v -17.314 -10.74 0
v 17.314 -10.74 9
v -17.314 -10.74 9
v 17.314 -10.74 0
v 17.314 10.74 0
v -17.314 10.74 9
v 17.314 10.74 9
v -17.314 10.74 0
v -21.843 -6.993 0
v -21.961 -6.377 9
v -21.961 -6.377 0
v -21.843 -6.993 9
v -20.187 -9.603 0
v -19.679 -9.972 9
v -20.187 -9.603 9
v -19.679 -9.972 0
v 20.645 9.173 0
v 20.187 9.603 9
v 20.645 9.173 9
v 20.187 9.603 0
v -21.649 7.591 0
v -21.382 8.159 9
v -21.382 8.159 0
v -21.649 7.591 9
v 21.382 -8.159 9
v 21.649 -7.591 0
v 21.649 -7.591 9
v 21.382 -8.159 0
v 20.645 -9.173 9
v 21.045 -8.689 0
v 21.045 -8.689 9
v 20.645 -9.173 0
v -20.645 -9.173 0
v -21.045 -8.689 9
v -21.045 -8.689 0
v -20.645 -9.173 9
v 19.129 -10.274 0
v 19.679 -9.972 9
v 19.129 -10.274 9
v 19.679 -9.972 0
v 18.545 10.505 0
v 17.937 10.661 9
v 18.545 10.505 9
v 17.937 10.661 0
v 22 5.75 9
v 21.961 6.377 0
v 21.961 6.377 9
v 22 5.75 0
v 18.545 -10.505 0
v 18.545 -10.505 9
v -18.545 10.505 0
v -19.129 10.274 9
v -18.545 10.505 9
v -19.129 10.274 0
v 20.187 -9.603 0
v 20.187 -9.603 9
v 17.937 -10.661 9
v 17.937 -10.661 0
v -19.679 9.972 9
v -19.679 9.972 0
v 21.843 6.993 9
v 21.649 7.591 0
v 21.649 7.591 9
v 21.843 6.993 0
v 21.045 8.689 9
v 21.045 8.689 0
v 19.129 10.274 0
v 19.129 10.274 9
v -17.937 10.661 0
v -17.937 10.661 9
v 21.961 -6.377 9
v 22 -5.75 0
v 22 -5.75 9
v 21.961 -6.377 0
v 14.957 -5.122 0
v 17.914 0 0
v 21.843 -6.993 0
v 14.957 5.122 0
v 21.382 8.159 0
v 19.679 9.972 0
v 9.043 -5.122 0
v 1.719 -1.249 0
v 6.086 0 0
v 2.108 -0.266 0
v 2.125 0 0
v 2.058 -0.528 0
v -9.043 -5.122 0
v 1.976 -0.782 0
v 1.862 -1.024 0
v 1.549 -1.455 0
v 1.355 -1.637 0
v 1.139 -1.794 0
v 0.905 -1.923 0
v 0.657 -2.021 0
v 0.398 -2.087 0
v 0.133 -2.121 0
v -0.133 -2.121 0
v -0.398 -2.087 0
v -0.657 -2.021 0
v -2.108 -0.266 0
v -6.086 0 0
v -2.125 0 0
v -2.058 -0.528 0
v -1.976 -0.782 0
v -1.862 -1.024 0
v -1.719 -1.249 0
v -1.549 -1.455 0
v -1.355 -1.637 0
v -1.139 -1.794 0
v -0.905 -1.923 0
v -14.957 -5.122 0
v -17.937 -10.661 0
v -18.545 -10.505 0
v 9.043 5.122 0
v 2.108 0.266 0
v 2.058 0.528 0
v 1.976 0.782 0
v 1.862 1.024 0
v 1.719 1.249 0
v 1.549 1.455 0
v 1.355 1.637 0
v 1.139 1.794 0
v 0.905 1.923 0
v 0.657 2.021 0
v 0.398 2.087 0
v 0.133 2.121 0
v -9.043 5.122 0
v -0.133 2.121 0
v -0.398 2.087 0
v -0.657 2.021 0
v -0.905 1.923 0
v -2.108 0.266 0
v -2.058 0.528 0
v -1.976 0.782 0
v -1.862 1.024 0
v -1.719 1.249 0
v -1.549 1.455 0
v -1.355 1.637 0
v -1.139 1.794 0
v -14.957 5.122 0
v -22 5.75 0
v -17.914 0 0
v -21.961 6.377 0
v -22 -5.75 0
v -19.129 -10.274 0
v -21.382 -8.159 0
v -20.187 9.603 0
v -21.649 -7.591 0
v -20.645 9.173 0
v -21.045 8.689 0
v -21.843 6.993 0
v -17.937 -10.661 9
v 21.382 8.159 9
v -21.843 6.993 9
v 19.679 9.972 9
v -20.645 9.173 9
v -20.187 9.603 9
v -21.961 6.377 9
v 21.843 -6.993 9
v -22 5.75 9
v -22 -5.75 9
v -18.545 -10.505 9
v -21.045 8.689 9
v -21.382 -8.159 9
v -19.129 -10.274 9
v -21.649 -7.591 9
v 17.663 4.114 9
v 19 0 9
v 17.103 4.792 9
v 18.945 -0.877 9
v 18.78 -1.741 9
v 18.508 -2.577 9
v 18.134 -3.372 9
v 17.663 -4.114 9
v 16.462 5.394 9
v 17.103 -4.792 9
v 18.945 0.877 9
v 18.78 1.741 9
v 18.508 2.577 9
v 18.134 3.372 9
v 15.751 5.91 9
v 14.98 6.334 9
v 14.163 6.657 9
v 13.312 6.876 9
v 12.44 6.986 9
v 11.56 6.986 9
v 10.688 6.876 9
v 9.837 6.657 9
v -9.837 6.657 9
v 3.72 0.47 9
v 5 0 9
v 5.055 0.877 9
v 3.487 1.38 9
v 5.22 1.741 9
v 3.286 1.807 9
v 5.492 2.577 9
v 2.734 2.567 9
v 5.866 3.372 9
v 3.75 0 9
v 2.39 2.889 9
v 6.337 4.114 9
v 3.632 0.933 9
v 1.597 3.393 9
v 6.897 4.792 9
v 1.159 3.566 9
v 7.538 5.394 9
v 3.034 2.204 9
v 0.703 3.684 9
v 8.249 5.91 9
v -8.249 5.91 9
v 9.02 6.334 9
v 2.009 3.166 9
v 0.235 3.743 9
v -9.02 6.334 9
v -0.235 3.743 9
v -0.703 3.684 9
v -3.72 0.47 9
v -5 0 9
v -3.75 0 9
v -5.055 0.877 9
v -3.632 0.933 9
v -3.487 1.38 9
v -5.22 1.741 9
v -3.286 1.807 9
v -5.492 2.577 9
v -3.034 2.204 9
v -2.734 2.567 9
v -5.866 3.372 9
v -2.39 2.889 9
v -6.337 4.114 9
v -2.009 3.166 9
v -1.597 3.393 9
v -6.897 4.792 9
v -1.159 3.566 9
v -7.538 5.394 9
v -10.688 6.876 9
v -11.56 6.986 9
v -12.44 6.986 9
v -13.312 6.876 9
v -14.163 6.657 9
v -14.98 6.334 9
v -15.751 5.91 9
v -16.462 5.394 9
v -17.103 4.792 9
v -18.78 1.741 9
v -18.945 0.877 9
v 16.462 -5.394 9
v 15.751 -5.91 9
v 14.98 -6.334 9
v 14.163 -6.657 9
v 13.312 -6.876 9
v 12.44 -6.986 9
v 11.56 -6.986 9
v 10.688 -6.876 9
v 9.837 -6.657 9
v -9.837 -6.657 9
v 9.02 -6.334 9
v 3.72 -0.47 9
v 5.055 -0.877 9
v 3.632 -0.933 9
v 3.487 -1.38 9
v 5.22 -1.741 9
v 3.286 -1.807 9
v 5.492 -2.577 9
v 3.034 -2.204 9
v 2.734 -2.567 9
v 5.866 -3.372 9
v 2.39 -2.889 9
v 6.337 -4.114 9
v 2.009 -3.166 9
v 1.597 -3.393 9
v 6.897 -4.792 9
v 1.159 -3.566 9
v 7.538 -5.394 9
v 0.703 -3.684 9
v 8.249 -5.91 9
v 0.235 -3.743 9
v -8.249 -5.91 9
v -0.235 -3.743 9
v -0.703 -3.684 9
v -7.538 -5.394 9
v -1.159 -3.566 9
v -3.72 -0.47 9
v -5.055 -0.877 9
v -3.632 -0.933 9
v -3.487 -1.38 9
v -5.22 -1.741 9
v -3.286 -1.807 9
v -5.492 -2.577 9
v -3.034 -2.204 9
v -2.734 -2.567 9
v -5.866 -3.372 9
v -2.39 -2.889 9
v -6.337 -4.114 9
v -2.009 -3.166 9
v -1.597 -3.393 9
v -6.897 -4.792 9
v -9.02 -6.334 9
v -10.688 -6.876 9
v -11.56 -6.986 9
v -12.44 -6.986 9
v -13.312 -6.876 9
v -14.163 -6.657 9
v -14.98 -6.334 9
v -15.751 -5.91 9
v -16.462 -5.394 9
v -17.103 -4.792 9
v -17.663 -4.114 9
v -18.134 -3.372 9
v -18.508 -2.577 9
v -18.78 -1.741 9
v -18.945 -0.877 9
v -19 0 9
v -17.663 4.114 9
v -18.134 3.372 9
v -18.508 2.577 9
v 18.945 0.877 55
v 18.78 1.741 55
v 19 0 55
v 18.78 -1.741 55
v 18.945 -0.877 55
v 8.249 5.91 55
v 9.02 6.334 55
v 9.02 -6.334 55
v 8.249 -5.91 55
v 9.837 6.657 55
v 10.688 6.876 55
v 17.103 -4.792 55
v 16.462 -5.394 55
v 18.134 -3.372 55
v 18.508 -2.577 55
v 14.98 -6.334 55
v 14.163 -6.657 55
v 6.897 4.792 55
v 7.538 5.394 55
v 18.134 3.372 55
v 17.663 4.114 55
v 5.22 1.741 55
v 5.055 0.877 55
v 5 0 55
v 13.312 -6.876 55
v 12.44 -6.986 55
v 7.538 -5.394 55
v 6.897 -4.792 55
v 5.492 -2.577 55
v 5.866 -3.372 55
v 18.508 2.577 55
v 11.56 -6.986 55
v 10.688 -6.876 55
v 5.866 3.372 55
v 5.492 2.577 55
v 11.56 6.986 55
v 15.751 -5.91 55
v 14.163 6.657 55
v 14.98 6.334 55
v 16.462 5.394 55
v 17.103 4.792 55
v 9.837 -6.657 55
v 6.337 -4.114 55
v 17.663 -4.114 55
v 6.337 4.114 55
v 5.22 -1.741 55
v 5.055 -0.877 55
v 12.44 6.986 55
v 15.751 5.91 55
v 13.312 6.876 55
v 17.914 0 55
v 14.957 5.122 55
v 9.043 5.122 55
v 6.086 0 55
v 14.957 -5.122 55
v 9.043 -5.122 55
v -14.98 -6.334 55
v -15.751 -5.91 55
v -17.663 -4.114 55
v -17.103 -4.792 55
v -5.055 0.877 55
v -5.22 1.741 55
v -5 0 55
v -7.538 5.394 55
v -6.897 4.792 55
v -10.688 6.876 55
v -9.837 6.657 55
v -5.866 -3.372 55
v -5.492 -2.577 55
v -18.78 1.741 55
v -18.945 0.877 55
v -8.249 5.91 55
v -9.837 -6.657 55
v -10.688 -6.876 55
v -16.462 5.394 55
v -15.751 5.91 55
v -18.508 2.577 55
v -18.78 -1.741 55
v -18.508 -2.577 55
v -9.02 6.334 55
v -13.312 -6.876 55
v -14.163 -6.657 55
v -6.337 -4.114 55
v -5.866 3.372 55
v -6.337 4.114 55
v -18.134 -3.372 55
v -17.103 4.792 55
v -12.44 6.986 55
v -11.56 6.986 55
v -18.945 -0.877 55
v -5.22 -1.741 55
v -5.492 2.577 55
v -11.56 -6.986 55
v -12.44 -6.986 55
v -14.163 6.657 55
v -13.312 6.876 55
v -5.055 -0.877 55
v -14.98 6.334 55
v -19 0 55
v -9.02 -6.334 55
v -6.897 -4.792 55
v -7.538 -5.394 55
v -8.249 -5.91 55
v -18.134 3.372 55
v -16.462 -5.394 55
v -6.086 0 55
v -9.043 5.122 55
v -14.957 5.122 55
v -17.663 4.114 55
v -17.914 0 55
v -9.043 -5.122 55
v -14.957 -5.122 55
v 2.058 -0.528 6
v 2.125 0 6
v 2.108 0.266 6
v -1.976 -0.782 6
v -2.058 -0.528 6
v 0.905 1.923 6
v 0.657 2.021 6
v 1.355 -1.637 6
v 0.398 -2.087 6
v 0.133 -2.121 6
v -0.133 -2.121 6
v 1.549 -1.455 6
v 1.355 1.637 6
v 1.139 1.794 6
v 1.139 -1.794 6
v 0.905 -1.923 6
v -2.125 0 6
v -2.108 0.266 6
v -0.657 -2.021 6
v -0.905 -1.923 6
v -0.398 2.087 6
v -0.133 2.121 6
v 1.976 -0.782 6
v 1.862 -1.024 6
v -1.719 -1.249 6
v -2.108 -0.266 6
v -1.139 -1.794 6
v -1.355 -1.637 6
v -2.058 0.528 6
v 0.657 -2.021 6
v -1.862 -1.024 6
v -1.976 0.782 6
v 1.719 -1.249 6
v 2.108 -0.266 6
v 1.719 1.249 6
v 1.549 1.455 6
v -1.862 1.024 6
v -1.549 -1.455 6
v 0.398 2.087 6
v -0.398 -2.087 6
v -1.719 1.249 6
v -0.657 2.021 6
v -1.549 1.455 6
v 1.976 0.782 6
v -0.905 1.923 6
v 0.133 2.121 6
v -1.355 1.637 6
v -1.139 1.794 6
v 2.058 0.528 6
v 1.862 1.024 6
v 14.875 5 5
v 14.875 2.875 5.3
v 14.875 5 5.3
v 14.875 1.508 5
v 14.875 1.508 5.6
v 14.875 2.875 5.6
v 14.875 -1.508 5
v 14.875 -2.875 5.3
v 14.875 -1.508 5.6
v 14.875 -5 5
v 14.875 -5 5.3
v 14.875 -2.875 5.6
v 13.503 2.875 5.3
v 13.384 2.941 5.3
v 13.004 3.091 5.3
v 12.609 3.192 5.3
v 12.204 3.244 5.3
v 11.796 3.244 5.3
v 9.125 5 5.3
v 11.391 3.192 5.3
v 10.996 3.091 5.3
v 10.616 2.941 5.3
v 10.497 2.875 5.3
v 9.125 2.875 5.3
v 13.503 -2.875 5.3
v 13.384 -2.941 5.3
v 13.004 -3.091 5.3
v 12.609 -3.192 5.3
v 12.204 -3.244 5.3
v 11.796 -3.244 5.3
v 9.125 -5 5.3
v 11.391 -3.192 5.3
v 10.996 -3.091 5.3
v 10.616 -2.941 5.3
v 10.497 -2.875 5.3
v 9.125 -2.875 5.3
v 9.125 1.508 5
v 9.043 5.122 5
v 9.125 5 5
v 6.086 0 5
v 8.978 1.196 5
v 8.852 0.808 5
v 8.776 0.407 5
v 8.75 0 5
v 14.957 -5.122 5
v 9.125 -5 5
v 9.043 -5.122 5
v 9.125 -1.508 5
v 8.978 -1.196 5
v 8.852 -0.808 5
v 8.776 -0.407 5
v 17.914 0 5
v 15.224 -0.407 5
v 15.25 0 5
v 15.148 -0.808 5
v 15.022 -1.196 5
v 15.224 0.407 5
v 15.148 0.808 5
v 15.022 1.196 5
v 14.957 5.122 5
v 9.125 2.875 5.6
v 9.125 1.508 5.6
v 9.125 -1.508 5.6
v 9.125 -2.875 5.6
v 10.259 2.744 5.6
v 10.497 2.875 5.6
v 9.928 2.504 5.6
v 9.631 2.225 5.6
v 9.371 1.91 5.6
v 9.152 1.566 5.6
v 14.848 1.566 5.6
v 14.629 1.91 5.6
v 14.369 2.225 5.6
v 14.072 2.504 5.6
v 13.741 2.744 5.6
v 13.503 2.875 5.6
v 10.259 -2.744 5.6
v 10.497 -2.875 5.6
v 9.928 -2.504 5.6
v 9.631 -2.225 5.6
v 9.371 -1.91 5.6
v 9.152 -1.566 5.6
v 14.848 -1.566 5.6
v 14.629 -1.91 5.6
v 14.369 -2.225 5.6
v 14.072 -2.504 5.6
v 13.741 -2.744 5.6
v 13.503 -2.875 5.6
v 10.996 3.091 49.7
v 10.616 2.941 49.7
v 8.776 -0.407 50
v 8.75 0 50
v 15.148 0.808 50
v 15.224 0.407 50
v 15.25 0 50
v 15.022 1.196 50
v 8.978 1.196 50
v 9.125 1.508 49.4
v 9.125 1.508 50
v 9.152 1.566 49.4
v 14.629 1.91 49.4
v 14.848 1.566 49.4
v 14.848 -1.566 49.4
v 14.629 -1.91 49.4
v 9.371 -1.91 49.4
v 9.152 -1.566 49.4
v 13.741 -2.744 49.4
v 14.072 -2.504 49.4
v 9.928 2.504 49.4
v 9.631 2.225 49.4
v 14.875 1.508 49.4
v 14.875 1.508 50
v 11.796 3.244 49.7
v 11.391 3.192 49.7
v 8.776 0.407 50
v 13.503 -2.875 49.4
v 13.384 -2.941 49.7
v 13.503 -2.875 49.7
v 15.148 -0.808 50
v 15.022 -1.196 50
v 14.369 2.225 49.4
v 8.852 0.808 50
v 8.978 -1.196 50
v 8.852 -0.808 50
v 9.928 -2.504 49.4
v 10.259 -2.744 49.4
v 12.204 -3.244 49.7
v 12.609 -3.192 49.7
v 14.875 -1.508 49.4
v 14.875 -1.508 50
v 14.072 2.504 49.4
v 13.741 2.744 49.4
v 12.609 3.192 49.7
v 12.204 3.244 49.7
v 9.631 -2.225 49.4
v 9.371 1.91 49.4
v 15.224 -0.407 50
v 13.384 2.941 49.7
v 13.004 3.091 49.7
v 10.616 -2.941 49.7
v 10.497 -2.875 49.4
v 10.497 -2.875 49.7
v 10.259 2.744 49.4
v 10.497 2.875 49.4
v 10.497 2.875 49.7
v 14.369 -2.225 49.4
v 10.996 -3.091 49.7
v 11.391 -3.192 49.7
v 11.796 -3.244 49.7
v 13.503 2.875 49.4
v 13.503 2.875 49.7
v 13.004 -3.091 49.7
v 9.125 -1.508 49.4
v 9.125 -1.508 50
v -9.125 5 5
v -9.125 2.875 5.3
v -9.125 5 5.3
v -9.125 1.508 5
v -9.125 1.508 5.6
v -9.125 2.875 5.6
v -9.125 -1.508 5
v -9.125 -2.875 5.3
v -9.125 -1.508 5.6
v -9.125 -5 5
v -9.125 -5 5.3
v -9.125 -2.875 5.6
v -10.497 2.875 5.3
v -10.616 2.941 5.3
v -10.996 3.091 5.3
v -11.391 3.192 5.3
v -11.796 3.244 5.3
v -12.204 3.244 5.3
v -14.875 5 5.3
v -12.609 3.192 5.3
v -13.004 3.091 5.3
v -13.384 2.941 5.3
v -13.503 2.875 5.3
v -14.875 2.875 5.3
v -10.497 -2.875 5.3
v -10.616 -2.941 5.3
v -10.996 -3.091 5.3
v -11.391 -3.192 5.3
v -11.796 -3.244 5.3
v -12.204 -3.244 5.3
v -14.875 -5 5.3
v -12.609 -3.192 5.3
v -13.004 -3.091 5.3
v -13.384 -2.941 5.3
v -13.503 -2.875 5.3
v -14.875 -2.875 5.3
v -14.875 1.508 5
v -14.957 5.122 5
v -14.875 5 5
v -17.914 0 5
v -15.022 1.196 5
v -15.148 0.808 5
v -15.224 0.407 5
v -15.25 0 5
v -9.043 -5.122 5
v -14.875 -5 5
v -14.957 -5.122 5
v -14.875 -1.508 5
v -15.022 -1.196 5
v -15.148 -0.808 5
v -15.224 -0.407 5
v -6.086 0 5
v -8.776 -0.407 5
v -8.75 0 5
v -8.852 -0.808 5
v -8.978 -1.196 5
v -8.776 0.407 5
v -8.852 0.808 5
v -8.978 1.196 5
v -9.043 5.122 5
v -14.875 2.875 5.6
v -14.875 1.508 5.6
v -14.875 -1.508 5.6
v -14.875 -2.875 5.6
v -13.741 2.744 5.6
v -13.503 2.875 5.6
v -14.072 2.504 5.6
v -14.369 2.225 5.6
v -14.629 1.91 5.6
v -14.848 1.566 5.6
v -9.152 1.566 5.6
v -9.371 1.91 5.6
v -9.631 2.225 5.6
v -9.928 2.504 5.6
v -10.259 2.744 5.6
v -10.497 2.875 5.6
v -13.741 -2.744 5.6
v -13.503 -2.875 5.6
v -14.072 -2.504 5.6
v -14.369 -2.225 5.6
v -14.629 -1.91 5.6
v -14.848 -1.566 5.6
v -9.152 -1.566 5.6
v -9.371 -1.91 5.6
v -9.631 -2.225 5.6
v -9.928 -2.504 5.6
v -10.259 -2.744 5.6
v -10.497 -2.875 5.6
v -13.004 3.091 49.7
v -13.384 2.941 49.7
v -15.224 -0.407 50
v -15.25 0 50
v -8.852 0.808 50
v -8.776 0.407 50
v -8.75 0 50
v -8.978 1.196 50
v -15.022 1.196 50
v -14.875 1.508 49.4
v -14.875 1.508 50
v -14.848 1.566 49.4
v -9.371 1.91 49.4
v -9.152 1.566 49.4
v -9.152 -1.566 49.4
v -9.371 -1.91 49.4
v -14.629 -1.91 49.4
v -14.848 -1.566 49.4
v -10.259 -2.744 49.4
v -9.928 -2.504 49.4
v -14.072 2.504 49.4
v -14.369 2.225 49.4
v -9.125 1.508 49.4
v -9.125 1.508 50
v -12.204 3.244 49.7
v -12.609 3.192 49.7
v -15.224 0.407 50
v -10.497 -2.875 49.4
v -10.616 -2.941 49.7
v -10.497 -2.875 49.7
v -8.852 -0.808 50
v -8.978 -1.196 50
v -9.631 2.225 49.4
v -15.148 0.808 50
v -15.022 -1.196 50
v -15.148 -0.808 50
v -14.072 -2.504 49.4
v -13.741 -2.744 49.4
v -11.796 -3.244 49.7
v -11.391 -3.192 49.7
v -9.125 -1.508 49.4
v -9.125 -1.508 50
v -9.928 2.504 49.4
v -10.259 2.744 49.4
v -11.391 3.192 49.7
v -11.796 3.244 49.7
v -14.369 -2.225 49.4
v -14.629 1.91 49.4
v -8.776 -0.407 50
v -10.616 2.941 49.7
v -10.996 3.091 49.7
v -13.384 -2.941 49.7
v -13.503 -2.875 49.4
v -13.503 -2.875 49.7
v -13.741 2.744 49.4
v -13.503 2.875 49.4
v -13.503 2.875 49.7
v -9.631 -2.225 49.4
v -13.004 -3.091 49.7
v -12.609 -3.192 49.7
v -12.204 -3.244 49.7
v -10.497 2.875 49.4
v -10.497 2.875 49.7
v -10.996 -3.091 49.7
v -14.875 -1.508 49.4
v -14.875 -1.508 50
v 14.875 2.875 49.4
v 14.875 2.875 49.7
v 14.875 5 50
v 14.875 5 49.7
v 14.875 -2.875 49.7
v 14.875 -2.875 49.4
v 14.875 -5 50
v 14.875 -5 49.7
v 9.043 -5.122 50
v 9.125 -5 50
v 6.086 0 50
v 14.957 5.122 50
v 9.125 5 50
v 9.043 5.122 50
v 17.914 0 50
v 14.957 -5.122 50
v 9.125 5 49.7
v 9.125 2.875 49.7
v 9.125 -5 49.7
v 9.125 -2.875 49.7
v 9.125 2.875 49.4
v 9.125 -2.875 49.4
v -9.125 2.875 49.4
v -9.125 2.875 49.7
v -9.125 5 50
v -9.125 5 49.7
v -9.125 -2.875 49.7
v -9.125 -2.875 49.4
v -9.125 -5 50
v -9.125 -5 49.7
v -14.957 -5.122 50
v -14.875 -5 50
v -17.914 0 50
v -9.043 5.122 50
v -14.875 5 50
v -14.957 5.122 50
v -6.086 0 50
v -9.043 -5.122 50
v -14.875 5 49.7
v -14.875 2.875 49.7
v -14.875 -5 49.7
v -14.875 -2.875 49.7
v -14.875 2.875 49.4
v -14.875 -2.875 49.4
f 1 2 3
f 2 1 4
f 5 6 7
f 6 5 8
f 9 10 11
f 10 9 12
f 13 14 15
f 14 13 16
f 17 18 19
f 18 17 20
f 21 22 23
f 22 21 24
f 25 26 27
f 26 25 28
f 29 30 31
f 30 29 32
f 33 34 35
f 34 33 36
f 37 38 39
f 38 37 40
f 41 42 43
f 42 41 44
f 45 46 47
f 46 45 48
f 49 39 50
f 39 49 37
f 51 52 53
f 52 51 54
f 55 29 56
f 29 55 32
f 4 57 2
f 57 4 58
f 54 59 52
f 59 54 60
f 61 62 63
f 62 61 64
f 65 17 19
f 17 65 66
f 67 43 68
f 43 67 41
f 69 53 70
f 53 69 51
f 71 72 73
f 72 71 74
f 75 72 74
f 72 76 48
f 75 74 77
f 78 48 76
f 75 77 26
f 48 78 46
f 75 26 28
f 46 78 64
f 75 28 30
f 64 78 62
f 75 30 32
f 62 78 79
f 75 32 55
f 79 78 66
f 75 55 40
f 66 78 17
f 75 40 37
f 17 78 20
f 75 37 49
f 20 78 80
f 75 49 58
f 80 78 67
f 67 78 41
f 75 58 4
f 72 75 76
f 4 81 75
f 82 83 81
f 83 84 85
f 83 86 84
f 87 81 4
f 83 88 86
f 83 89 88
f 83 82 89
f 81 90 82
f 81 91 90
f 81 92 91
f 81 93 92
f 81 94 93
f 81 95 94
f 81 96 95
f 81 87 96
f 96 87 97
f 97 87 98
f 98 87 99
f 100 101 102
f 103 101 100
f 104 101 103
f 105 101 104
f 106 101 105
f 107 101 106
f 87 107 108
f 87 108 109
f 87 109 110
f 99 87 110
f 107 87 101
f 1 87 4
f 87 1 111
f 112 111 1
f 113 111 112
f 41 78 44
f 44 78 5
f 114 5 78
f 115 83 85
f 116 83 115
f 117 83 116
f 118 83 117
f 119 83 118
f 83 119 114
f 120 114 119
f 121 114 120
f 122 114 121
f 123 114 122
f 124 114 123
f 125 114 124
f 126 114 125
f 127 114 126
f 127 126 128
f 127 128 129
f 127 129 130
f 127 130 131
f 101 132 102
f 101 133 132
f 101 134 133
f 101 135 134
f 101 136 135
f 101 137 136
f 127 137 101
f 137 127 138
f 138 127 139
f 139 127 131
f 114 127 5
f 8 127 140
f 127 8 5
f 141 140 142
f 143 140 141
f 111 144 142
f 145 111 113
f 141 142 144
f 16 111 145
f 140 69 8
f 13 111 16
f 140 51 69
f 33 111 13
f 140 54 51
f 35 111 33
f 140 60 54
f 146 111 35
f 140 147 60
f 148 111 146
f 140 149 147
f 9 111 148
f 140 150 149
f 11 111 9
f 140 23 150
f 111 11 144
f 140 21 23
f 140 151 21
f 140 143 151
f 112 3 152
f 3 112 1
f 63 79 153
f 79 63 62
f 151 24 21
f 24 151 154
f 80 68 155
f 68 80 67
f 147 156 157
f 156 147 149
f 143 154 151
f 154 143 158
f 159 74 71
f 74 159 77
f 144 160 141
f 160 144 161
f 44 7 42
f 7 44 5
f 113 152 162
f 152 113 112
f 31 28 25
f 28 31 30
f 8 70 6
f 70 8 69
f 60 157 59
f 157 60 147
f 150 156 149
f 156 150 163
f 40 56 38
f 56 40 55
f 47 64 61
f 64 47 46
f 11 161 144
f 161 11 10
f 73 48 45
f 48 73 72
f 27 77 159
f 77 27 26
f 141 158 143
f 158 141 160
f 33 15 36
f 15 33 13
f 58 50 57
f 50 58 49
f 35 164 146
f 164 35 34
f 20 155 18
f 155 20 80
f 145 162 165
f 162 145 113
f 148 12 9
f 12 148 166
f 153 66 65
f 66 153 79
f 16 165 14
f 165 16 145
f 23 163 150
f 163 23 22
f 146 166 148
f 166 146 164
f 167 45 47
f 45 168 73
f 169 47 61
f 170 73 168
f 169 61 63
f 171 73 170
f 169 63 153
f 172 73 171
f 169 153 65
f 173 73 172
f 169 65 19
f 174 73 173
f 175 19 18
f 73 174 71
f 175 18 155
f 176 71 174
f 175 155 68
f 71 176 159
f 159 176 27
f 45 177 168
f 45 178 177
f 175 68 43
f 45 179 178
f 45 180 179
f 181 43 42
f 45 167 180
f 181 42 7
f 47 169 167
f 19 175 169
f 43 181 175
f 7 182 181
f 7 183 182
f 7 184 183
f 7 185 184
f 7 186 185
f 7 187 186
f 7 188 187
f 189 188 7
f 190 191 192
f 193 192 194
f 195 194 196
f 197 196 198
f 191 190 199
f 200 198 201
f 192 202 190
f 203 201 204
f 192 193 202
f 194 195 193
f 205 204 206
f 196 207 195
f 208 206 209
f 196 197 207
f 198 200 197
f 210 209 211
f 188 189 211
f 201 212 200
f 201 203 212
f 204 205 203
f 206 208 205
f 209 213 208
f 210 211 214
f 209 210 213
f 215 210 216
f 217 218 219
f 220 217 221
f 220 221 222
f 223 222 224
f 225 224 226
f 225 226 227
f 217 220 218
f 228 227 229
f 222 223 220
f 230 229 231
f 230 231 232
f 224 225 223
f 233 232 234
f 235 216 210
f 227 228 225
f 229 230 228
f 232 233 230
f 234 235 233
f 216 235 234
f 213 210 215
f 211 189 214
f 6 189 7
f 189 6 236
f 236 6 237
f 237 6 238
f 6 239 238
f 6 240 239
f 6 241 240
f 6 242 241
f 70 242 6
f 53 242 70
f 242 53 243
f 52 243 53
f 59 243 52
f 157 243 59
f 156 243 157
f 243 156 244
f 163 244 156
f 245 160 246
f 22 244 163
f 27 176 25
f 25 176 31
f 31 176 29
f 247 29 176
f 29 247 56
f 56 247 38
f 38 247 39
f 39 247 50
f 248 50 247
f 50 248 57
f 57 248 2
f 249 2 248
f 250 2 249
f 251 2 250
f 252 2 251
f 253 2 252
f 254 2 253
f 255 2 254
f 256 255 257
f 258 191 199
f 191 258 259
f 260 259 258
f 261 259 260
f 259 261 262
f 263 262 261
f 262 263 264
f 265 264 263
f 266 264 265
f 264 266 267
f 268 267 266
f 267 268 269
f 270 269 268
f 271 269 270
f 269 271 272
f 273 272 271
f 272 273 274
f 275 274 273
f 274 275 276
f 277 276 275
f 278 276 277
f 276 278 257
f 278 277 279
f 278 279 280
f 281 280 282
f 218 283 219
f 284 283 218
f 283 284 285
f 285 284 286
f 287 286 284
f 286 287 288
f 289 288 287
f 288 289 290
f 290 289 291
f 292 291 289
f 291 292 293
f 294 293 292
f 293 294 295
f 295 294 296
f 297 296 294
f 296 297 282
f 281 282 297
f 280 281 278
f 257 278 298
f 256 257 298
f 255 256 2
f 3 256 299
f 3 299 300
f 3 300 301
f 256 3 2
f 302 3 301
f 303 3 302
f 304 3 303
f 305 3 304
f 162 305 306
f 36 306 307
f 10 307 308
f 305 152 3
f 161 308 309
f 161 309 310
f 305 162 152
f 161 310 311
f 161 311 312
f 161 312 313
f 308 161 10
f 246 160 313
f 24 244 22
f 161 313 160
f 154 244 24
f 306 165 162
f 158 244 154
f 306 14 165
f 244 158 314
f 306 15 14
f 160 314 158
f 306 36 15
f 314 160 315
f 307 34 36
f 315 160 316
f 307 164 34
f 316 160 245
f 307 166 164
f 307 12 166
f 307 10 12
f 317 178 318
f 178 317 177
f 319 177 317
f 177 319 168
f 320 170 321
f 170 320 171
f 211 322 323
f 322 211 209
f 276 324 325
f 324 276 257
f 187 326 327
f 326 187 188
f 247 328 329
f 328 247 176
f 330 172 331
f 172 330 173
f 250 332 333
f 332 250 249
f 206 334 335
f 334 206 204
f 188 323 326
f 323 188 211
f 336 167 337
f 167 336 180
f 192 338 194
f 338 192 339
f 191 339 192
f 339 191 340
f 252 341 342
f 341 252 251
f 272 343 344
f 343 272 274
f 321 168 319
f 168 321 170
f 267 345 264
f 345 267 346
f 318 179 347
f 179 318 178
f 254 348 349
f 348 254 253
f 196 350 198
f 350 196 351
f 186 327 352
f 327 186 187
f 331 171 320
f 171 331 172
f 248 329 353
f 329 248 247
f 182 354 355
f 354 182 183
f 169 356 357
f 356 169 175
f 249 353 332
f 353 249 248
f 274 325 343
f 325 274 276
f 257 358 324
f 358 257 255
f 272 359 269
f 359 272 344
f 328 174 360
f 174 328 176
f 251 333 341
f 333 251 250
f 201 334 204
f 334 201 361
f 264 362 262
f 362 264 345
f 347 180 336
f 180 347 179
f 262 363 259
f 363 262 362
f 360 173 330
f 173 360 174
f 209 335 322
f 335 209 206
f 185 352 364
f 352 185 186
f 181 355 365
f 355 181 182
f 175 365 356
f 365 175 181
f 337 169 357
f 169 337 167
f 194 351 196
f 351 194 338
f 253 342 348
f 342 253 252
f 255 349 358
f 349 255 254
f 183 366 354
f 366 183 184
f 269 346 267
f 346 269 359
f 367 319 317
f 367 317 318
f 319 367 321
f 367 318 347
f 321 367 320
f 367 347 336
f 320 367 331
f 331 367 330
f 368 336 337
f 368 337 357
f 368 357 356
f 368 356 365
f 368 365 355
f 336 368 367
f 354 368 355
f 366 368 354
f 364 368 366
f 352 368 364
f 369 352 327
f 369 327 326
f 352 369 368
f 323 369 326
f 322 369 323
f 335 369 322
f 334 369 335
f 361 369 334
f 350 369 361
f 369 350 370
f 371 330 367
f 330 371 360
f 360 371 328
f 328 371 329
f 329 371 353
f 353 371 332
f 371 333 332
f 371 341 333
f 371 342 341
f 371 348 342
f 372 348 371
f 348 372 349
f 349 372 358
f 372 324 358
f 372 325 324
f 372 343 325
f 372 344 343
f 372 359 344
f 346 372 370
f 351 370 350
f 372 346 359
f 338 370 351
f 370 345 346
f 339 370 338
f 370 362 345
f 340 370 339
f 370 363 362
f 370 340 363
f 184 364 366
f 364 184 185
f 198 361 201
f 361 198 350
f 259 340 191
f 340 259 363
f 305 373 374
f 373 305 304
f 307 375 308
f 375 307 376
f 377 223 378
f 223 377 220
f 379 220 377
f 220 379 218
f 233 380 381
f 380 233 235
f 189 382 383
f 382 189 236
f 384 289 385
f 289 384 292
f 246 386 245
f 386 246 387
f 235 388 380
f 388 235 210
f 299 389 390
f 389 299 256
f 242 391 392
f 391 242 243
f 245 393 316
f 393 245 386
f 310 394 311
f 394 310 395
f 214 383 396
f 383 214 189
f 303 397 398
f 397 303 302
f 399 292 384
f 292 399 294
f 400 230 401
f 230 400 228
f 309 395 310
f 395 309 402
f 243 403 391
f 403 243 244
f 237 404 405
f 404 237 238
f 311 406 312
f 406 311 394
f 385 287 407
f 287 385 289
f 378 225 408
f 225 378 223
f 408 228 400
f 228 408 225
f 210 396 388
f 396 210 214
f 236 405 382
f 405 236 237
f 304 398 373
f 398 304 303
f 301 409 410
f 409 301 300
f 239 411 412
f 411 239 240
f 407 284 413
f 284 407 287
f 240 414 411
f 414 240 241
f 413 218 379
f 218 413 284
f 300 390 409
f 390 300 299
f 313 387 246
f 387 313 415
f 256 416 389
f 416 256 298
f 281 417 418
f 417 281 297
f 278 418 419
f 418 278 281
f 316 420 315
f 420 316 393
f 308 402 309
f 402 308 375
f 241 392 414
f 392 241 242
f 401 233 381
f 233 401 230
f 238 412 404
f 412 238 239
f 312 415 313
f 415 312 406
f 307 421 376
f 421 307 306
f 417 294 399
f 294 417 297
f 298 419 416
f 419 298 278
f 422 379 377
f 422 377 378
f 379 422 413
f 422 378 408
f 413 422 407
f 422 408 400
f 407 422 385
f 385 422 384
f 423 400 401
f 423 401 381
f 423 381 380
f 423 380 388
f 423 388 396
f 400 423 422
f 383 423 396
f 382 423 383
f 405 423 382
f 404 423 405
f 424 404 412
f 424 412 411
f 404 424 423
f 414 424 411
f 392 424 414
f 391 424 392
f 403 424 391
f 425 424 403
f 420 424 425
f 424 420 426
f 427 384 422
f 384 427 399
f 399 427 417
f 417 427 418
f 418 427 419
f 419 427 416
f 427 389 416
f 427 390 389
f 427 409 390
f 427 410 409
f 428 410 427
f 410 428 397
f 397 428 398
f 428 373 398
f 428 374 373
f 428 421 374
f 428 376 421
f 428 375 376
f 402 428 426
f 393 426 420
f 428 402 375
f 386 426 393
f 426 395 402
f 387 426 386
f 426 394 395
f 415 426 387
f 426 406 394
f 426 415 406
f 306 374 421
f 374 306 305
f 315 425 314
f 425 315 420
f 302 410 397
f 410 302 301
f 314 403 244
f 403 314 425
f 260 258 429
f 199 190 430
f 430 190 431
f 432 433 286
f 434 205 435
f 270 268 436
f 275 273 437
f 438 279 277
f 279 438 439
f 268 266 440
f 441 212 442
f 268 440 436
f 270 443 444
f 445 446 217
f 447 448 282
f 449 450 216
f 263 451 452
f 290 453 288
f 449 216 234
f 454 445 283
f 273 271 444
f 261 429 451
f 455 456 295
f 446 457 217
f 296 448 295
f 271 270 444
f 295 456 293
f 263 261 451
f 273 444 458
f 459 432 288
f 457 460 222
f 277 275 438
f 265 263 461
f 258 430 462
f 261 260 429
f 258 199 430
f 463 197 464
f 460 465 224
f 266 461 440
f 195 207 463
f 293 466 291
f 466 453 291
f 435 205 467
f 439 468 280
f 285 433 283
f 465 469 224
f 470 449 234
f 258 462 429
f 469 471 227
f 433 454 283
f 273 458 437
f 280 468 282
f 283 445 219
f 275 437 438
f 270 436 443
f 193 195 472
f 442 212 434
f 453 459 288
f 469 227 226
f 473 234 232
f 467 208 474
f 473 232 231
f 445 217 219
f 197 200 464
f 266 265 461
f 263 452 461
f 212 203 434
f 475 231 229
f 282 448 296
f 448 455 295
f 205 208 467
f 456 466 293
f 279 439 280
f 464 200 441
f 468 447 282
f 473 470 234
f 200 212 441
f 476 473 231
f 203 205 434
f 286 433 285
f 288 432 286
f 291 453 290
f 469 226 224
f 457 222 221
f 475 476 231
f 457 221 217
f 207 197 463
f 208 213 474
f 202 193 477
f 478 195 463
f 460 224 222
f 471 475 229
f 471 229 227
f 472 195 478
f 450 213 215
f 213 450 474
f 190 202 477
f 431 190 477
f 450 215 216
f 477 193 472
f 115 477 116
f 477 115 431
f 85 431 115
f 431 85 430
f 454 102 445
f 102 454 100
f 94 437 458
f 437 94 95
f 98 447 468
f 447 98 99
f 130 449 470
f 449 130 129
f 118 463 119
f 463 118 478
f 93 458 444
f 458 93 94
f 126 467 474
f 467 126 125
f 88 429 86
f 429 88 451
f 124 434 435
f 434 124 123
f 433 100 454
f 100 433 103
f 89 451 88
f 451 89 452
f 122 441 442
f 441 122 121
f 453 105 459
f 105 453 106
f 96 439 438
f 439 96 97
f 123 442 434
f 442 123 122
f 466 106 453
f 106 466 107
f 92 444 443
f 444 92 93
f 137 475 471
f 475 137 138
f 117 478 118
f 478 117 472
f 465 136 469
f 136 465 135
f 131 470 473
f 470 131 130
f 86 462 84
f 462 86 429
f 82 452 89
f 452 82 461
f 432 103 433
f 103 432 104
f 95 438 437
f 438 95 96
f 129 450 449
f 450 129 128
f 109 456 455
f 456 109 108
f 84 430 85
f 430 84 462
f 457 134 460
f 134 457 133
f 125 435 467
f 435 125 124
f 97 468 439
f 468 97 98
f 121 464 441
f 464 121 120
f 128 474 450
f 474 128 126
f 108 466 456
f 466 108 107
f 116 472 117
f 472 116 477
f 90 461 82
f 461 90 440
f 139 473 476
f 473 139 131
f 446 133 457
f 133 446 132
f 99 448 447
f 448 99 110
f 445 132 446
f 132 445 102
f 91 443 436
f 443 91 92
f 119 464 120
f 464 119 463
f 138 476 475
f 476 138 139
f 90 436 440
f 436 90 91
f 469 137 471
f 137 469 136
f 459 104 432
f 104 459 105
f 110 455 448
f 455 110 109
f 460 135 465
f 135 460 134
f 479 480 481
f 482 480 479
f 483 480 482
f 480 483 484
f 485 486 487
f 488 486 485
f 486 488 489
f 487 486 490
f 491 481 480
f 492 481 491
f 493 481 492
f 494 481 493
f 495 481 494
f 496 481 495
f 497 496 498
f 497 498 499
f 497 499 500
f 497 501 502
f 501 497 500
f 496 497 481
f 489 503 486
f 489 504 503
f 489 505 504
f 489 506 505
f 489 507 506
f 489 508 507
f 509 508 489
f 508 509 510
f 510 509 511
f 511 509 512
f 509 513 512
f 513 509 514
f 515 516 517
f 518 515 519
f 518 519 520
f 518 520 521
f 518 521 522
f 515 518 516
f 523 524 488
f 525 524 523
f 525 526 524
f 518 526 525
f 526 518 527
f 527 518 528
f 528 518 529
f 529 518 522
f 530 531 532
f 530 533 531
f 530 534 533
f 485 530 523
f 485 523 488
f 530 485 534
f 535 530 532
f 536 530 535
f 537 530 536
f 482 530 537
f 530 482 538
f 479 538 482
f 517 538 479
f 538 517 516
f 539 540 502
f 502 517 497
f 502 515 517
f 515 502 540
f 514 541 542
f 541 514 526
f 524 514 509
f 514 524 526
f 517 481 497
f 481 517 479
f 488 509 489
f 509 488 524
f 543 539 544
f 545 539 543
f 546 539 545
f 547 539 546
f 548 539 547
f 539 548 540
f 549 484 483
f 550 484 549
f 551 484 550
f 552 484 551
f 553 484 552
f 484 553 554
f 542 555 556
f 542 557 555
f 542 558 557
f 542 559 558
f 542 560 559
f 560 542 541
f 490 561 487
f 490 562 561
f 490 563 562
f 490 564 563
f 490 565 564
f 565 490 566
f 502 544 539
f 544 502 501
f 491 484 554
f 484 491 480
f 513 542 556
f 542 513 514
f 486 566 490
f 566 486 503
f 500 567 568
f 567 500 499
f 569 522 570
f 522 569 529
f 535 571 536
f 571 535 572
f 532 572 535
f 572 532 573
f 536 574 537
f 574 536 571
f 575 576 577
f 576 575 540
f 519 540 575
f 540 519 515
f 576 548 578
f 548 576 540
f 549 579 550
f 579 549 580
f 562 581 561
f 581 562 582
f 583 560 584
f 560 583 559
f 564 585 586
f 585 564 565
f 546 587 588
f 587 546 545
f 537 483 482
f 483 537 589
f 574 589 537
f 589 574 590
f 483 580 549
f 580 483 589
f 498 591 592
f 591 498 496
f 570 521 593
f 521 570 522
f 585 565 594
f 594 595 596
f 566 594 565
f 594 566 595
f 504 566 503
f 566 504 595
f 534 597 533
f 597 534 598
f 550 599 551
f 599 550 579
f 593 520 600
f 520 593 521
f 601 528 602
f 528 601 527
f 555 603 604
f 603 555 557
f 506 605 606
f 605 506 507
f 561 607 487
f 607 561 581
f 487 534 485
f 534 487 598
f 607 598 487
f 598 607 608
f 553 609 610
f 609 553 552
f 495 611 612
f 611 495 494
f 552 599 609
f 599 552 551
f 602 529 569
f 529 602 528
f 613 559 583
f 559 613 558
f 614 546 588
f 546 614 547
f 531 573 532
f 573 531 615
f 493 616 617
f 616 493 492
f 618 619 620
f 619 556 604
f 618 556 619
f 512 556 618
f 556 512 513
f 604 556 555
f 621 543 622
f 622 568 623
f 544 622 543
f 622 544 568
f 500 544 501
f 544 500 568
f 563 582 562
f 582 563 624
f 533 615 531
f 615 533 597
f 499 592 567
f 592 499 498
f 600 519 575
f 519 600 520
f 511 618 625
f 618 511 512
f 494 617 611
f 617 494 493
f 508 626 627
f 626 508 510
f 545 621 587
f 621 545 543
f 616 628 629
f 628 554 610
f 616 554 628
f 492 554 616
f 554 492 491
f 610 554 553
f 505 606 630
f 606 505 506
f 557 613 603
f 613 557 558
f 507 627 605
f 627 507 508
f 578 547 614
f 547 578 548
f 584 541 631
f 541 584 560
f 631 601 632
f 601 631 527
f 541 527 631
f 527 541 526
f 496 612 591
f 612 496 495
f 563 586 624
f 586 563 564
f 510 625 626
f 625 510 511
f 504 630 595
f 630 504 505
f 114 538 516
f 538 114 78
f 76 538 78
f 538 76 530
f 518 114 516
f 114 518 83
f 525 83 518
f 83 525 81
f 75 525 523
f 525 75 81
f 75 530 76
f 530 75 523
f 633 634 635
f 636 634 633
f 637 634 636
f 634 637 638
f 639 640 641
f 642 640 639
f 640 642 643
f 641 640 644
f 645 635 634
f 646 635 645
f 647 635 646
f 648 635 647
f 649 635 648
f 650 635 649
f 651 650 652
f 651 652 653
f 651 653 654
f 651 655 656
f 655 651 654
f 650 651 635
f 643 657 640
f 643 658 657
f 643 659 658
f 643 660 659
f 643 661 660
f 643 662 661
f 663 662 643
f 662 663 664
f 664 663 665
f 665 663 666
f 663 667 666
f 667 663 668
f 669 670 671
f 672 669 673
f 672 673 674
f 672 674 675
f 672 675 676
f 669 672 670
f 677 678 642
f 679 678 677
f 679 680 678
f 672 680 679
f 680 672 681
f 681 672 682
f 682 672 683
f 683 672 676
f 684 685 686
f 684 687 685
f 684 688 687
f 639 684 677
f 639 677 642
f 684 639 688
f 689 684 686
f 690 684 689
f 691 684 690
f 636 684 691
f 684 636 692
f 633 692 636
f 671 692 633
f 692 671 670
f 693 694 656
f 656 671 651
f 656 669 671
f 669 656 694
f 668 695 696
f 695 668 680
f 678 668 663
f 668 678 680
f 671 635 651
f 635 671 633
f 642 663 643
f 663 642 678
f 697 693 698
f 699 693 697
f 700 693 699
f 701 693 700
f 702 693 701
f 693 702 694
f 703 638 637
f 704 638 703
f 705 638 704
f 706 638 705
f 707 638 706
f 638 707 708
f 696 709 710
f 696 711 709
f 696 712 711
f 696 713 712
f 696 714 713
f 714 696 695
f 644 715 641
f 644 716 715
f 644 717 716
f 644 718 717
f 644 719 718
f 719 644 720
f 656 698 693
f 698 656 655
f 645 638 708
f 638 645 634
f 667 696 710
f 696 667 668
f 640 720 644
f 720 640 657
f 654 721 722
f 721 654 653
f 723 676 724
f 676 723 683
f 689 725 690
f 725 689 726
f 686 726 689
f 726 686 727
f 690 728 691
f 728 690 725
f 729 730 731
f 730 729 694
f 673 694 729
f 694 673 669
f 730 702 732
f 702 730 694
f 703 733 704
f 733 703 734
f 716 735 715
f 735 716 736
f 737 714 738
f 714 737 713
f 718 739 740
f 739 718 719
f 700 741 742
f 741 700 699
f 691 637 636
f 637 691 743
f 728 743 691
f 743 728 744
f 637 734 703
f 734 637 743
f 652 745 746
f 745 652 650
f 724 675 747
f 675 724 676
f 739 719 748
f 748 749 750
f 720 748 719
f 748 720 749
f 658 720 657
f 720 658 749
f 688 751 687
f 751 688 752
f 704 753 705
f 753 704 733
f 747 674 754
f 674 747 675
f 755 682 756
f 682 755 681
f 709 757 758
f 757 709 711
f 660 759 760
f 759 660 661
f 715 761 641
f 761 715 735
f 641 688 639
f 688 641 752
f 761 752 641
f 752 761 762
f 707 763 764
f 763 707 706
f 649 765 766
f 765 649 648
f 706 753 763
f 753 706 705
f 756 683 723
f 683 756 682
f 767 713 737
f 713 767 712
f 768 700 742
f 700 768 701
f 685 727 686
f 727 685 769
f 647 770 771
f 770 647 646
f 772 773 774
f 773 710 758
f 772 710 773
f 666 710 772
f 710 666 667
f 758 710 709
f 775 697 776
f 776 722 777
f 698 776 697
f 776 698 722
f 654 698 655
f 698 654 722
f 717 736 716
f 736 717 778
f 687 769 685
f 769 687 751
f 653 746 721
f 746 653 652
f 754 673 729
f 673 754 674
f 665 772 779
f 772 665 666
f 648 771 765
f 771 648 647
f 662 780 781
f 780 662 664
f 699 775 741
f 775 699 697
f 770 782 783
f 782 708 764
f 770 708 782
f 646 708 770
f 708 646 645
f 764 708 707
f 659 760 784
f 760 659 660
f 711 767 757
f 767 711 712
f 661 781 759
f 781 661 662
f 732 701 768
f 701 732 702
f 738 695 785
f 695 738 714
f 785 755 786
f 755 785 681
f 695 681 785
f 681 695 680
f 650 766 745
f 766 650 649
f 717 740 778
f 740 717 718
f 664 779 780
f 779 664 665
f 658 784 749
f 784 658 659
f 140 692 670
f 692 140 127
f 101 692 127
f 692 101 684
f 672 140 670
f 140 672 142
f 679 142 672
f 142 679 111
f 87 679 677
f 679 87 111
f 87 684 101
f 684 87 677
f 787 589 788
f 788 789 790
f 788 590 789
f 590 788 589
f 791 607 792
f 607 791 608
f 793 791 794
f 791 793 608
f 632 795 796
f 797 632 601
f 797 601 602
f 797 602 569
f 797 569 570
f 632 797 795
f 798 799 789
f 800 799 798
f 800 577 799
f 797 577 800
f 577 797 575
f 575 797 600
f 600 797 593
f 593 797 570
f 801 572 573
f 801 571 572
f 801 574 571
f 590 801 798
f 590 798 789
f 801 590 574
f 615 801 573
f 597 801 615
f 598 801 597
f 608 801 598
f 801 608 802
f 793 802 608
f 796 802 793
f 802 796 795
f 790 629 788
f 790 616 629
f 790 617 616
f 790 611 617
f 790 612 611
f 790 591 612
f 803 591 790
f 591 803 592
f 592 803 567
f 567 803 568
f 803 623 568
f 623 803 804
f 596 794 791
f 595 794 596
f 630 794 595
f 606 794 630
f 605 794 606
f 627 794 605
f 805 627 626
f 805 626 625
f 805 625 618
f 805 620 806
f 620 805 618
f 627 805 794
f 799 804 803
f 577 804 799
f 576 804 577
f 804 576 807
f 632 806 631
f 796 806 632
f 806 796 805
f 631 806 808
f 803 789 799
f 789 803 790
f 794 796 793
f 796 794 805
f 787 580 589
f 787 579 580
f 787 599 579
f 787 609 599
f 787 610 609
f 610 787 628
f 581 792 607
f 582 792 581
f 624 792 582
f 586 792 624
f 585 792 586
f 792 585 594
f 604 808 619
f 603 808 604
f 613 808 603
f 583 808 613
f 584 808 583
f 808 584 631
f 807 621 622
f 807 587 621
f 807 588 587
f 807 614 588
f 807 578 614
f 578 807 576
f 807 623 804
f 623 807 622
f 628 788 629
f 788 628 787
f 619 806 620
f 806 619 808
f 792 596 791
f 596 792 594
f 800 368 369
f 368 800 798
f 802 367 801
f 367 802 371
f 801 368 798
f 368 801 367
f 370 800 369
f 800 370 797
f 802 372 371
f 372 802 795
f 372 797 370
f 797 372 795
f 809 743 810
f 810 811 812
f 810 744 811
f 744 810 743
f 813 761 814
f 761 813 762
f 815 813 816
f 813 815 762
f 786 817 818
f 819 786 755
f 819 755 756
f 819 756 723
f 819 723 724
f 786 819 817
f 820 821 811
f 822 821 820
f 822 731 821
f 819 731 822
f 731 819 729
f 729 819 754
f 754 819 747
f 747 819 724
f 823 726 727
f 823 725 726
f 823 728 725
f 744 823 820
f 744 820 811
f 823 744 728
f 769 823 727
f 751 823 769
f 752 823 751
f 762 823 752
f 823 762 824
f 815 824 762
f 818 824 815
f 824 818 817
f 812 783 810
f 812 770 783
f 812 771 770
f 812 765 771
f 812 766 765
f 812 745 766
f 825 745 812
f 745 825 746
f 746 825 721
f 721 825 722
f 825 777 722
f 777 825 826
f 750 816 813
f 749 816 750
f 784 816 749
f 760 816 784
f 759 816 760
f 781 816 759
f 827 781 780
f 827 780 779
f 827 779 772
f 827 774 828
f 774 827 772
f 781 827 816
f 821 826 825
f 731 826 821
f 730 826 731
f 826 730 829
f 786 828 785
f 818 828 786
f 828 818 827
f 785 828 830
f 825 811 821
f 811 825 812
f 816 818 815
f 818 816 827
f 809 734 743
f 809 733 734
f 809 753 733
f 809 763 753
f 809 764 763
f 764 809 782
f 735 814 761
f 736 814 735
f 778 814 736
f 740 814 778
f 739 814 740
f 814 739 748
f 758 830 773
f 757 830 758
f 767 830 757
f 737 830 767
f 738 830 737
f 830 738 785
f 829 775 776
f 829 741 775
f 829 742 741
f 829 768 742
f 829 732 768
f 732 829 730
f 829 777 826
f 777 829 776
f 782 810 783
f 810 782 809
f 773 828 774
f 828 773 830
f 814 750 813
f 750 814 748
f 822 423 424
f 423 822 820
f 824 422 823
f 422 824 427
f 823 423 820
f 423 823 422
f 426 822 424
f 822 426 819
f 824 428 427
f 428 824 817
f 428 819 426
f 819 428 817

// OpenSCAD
$fn = 50;


difference() {
	union() {
		hull() {
			translate(v = [-17.0000000000, 5.7500000000, 0]) {
				cylinder(h = 9, r = 5);
			}
			translate(v = [17.0000000000, 5.7500000000, 0]) {
				cylinder(h = 9, r = 5);
			}
			translate(v = [-17.0000000000, -5.7500000000, 0]) {
				cylinder(h = 9, r = 5);
			}
			translate(v = [17.0000000000, -5.7500000000, 0]) {
				cylinder(h = 9, r = 5);
			}
		}
		translate(v = [12.0000000000, 0, 0.0000000000]) {
			cylinder(h = 55, r = 7.0000000000);
		}
		translate(v = [-12.0000000000, 0, 0.0000000000]) {
			cylinder(h = 55, r = 7.0000000000);
		}
	}
	union() {
		translate(v = [0, 0, 9]) {
			rotate(a = [0, 0, 0]) {
				difference() {
					union() {
						#translate(v = [0, 0, -50.0000000000]) {
							cylinder(h = 50, r = 2.0000000000);
						}
						#translate(v = [0, 0, -3]) {
							cylinder(h = 3, r1 = 2.1250000000, r2 = 3.7500000000);
						}
						#translate(v = [0, 0, -50.0000000000]) {
							cylinder(h = 50, r = 2.1250000000);
						}
						#translate(v = [0, 0, -50.0000000000]) {
							cylinder(h = 50, r = 2.0000000000);
						}
					}
					union();
				}
			}
		}
		translate(v = [12.0000000000, 0, 0]) {
			rotate(a = [0, 0, 0]) {
				difference() {
					union() {
						#translate(v = [-2.8750000000, -5.0000000000, -0.3000000000]) {
							cube(size = [5.7500000000, 10, 0.3000000000]);
						}
						#translate(v = [-2.8750000000, -2.8750000000, -0.6000000000]) {
							cube(size = [5.7500000000, 5.7500000000, 0.3000000000]);
						}
						#translate(v = [-2.8750000000, -5.0000000000, 5]) {
							cube(size = [5.7500000000, 10, 0.3000000000]);
						}
						#translate(v = [-2.8750000000, -2.8750000000, 5.3000000000]) {
							cube(size = [5.7500000000, 5.7500000000, 0.3000000000]);
						}
						#translate(v = [0, 0, -100.0000000000]) {
							cylinder(h = 200, r = 3.2500000000);
						}
						#linear_extrude(height = 5) {
							polygon(points = [[5.9142500000, 0.0000000000], [2.9571250000, 5.1218907443], [-2.9571250000, 5.1218907443], [-5.9142500000, 0.0000000000], [-2.9571250000, -5.1218907443], [2.9571250000, -5.1218907443]]);
						}
						#translate(v = [-2.8750000000, -5.0000000000, -0.3000000000]) {
							cube(size = [5.7500000000, 10, 0.3000000000]);
						}
						#translate(v = [-2.8750000000, -2.8750000000, -0.6000000000]) {
							cube(size = [5.7500000000, 5.7500000000, 0.3000000000]);
						}
						#translate(v = [-2.8750000000, -5.0000000000, 5]) {
							cube(size = [5.7500000000, 10, 0.3000000000]);
						}
						#translate(v = [-2.8750000000, -2.8750000000, 5.3000000000]) {
							cube(size = [5.7500000000, 5.7500000000, 0.3000000000]);
						}
						#translate(v = [0, 0, -100.0000000000]) {
							cylinder(h = 200, r = 3.2500000000);
						}
						#translate(v = [-2.8750000000, -5.0000000000, -0.3000000000]) {
							cube(size = [5.7500000000, 10, 0.3000000000]);
						}
						#translate(v = [-2.8750000000, -2.8750000000, -0.6000000000]) {
							cube(size = [5.7500000000, 5.7500000000, 0.3000000000]);
						}
						#translate(v = [-2.8750000000, -5.0000000000, 5]) {
							cube(size = [5.7500000000, 10, 0.3000000000]);
						}
						#translate(v = [-2.8750000000, -2.8750000000, 5.3000000000]) {
							cube(size = [5.7500000000, 5.7500000000, 0.3000000000]);
						}
						#translate(v = [0, 0, -100.0000000000]) {
							cylinder(h = 200, r = 3.2500000000);
						}
					}
					union();
				}
			}
		}
		translate(v = [-12.0000000000, 0, 0]) {
			rotate(a = [0, 0, 0]) {
				difference() {
					union() {
						#translate(v = [-2.8750000000, -5.0000000000, -0.3000000000]) {
							cube(size = [5.7500000000, 10, 0.3000000000]);
						}
						#translate(v = [-2.8750000000, -2.8750000000, -0.6000000000]) {
							cube(size = [5.7500000000, 5.7500000000, 0.3000000000]);
						}
						#translate(v = [-2.8750000000, -5.0000000000, 5]) {
							cube(size = [5.7500000000, 10, 0.3000000000]);
						}
						#translate(v = [-2.8750000000, -2.8750000000, 5.3000000000]) {
							cube(size = [5.7500000000, 5.7500000000, 0.3000000000]);
						}
						#translate(v = [0, 0, -100.0000000000]) {
							cylinder(h = 200, r = 3.2500000000);
						}
						#linear_extrude(height = 5) {
							polygon(points = [[5.9142500000, 0.0000000000], [2.9571250000, 5.1218907443], [-2.9571250000, 5.1218907443], [-5.9142500000, 0.0000000000], [-2.9571250000, -5.1218907443], [2.9571250000, -5.1218907443]]);
						}
						#translate(v = [-2.8750000000, -5.0000000000, -0.3000000000]) {
							cube(size = [5.7500000000, 10, 0.3000000000]);
						}
						#translate(v = [-2.8750000000, -2.8750000000, -0.6000000000]) {
							cube(size = [5.7500000000, 5.7500000000, 0.3000000000]);
						}
						#translate(v = [-2.8750000000, -5.0000000000, 5]) {
							cube(size = [5.7500000000, 10, 0.3000000000]);
						}
						#translate(v = [-2.8750000000, -2.8750000000, 5.3000000000]) {
							cube(size = [5.7500000000, 5.7500000000, 0.3000000000]);
						}
						#translate(v = [0, 0, -100.0000000000]) {
							cylinder(h = 200, r = 3.2500000000);
						}
						#translate(v = [-2.8750000000, -5.0000000000, -0.3000000000]) {
							cube(size = [5.7500000000, 10, 0.3000000000]);
						}
						#translate(v = [-2.8750000000, -2.8750000000, -0.6000000000]) {
							cube(size = [5.7500000000, 5.7500000000, 0.3000000000]);
						}
						#translate(v = [-2.8750000000, -5.0000000000, 5]) {
							cube(size = [5.7500000000, 10, 0.3000000000]);
						}
						#translate(v = [-2.8750000000, -2.8750000000, 5.3000000000]) {
							cube(size = [5.7500000000, 5.7500000000, 0.3000000000]);
						}
						#translate(v = [0, 0, -100.0000000000]) {
							cylinder(h = 200, r = 3.2500000000);
						}
					}
					union();
				}
			}
		}
		translate(v = [12.0000000000, 0, 55]) {
			rotate(a = [0, 0, 0]) {
				difference() {
					union() {
						#translate(v = [-2.8750000000, -5.0000000000, -5.3000000000]) {
							cube(size = [5.7500000000, 10, 0.3000000000]);
						}
						#translate(v = [-2.8750000000, -2.8750000000, -5.6000000000]) {
							cube(size = [5.7500000000, 5.7500000000, 0.3000000000]);
						}
						#translate(v = [-2.8750000000, -5.0000000000, 0]) {
							cube(size = [5.7500000000, 10, 0.3000000000]);
						}
						#translate(v = [-2.8750000000, -2.8750000000, 0.3000000000]) {
							cube(size = [5.7500000000, 5.7500000000, 0.3000000000]);
						}
						#translate(v = [0, 0, -100.0000000000]) {
							cylinder(h = 200, r = 3.2500000000);
						}
						translate(v = [0, 0, -5]) {
							#linear_extrude(height = 5) {
								polygon(points = [[5.9142500000, 0.0000000000], [2.9571250000, 5.1218907443], [-2.9571250000, 5.1218907443], [-5.9142500000, 0.0000000000], [-2.9571250000, -5.1218907443], [2.9571250000, -5.1218907443]]);
							}
						}
						#translate(v = [-2.8750000000, -5.0000000000, -5.3000000000]) {
							cube(size = [5.7500000000, 10, 0.3000000000]);
						}
						#translate(v = [-2.8750000000, -2.8750000000, -5.6000000000]) {
							cube(size = [5.7500000000, 5.7500000000, 0.3000000000]);
						}
						#translate(v = [-2.8750000000, -5.0000000000, 0]) {
							cube(size = [5.7500000000, 10, 0.3000000000]);
						}
						#translate(v = [-2.8750000000, -2.8750000000, 0.3000000000]) {
							cube(size = [5.7500000000, 5.7500000000, 0.3000000000]);
						}
						#translate(v = [0, 0, -100.0000000000]) {
							cylinder(h = 200, r = 3.2500000000);
						}
						#translate(v = [-2.8750000000, -5.0000000000, -5.3000000000]) {
							cube(size = [5.7500000000, 10, 0.3000000000]);
						}
						#translate(v = [-2.8750000000, -2.8750000000, -5.6000000000]) {
							cube(size = [5.7500000000, 5.7500000000, 0.3000000000]);
						}
						#translate(v = [-2.8750000000, -5.0000000000, 0]) {
							cube(size = [5.7500000000, 10, 0.3000000000]);
						}
						#translate(v = [-2.8750000000, -2.8750000000, 0.3000000000]) {
							cube(size = [5.7500000000, 5.7500000000, 0.3000000000]);
						}
						#translate(v = [0, 0, -100.0000000000]) {
							cylinder(h = 200, r = 3.2500000000);
						}
					}
					union();
				}
			}
		}
		translate(v = [-12.0000000000, 0, 55]) {
			rotate(a = [0, 0, 0]) {
				difference() {
					union() {
						#translate(v = [-2.8750000000, -5.0000000000, -5.3000000000]) {
							cube(size = [5.7500000000, 10, 0.3000000000]);
						}
						#translate(v = [-2.8750000000, -2.8750000000, -5.6000000000]) {
							cube(size = [5.7500000000, 5.7500000000, 0.3000000000]);
						}
						#translate(v = [-2.8750000000, -5.0000000000, 0]) {
							cube(size = [5.7500000000, 10, 0.3000000000]);
						}
						#translate(v = [-2.8750000000, -2.8750000000, 0.3000000000]) {
							cube(size = [5.7500000000, 5.7500000000, 0.3000000000]);
						}
						#translate(v = [0, 0, -100.0000000000]) {
							cylinder(h = 200, r = 3.2500000000);
						}
						translate(v = [0, 0, -5]) {
							#linear_extrude(height = 5) {
								polygon(points = [[5.9142500000, 0.0000000000], [2.9571250000, 5.1218907443], [-2.9571250000, 5.1218907443], [-5.9142500000, 0.0000000000], [-2.9571250000, -5.1218907443], [2.9571250000, -5.1218907443]]);
							}
						}
						#translate(v = [-2.8750000000, -5.0000000000, -5.3000000000]) {
							cube(size = [5.7500000000, 10, 0.3000000000]);
						}
						#translate(v = [-2.8750000000, -2.8750000000, -5.6000000000]) {
							cube(size = [5.7500000000, 5.7500000000, 0.3000000000]);
						}
						#translate(v = [-2.8750000000, -5.0000000000, 0]) {
							cube(size = [5.7500000000, 10, 0.3000000000]);
						}
						#translate(v = [-2.8750000000, -2.8750000000, 0.3000000000]) {
							cube(size = [5.7500000000, 5.7500000000, 0.3000000000]);
						}
						#translate(v = [0, 0, -100.0000000000]) {
							cylinder(h = 200, r = 3.2500000000);
						}
						#translate(v = [-2.8750000000, -5.0000000000, -5.3000000000]) {
							cube(size = [5.7500000000, 10, 0.3000000000]);
						}
						#translate(v = [-2.8750000000, -2.8750000000, -5.6000000000]) {
							cube(size = [5.7500000000, 5.7500000000, 0.3000000000]);
						}
						#translate(v = [-2.8750000000, -5.0000000000, 0]) {
							cube(size = [5.7500000000, 10, 0.3000000000]);
						}
						#translate(v = [-2.8750000000, -2.8750000000, 0.3000000000]) {
							cube(size = [5.7500000000, 5.7500000000, 0.3000000000]);
						}
						#translate(v = [0, 0, -100.0000000000]) {
							cylinder(h = 200, r = 3.2500000000);
						}
					}
					union();
				}
			}
		}
	}
}
